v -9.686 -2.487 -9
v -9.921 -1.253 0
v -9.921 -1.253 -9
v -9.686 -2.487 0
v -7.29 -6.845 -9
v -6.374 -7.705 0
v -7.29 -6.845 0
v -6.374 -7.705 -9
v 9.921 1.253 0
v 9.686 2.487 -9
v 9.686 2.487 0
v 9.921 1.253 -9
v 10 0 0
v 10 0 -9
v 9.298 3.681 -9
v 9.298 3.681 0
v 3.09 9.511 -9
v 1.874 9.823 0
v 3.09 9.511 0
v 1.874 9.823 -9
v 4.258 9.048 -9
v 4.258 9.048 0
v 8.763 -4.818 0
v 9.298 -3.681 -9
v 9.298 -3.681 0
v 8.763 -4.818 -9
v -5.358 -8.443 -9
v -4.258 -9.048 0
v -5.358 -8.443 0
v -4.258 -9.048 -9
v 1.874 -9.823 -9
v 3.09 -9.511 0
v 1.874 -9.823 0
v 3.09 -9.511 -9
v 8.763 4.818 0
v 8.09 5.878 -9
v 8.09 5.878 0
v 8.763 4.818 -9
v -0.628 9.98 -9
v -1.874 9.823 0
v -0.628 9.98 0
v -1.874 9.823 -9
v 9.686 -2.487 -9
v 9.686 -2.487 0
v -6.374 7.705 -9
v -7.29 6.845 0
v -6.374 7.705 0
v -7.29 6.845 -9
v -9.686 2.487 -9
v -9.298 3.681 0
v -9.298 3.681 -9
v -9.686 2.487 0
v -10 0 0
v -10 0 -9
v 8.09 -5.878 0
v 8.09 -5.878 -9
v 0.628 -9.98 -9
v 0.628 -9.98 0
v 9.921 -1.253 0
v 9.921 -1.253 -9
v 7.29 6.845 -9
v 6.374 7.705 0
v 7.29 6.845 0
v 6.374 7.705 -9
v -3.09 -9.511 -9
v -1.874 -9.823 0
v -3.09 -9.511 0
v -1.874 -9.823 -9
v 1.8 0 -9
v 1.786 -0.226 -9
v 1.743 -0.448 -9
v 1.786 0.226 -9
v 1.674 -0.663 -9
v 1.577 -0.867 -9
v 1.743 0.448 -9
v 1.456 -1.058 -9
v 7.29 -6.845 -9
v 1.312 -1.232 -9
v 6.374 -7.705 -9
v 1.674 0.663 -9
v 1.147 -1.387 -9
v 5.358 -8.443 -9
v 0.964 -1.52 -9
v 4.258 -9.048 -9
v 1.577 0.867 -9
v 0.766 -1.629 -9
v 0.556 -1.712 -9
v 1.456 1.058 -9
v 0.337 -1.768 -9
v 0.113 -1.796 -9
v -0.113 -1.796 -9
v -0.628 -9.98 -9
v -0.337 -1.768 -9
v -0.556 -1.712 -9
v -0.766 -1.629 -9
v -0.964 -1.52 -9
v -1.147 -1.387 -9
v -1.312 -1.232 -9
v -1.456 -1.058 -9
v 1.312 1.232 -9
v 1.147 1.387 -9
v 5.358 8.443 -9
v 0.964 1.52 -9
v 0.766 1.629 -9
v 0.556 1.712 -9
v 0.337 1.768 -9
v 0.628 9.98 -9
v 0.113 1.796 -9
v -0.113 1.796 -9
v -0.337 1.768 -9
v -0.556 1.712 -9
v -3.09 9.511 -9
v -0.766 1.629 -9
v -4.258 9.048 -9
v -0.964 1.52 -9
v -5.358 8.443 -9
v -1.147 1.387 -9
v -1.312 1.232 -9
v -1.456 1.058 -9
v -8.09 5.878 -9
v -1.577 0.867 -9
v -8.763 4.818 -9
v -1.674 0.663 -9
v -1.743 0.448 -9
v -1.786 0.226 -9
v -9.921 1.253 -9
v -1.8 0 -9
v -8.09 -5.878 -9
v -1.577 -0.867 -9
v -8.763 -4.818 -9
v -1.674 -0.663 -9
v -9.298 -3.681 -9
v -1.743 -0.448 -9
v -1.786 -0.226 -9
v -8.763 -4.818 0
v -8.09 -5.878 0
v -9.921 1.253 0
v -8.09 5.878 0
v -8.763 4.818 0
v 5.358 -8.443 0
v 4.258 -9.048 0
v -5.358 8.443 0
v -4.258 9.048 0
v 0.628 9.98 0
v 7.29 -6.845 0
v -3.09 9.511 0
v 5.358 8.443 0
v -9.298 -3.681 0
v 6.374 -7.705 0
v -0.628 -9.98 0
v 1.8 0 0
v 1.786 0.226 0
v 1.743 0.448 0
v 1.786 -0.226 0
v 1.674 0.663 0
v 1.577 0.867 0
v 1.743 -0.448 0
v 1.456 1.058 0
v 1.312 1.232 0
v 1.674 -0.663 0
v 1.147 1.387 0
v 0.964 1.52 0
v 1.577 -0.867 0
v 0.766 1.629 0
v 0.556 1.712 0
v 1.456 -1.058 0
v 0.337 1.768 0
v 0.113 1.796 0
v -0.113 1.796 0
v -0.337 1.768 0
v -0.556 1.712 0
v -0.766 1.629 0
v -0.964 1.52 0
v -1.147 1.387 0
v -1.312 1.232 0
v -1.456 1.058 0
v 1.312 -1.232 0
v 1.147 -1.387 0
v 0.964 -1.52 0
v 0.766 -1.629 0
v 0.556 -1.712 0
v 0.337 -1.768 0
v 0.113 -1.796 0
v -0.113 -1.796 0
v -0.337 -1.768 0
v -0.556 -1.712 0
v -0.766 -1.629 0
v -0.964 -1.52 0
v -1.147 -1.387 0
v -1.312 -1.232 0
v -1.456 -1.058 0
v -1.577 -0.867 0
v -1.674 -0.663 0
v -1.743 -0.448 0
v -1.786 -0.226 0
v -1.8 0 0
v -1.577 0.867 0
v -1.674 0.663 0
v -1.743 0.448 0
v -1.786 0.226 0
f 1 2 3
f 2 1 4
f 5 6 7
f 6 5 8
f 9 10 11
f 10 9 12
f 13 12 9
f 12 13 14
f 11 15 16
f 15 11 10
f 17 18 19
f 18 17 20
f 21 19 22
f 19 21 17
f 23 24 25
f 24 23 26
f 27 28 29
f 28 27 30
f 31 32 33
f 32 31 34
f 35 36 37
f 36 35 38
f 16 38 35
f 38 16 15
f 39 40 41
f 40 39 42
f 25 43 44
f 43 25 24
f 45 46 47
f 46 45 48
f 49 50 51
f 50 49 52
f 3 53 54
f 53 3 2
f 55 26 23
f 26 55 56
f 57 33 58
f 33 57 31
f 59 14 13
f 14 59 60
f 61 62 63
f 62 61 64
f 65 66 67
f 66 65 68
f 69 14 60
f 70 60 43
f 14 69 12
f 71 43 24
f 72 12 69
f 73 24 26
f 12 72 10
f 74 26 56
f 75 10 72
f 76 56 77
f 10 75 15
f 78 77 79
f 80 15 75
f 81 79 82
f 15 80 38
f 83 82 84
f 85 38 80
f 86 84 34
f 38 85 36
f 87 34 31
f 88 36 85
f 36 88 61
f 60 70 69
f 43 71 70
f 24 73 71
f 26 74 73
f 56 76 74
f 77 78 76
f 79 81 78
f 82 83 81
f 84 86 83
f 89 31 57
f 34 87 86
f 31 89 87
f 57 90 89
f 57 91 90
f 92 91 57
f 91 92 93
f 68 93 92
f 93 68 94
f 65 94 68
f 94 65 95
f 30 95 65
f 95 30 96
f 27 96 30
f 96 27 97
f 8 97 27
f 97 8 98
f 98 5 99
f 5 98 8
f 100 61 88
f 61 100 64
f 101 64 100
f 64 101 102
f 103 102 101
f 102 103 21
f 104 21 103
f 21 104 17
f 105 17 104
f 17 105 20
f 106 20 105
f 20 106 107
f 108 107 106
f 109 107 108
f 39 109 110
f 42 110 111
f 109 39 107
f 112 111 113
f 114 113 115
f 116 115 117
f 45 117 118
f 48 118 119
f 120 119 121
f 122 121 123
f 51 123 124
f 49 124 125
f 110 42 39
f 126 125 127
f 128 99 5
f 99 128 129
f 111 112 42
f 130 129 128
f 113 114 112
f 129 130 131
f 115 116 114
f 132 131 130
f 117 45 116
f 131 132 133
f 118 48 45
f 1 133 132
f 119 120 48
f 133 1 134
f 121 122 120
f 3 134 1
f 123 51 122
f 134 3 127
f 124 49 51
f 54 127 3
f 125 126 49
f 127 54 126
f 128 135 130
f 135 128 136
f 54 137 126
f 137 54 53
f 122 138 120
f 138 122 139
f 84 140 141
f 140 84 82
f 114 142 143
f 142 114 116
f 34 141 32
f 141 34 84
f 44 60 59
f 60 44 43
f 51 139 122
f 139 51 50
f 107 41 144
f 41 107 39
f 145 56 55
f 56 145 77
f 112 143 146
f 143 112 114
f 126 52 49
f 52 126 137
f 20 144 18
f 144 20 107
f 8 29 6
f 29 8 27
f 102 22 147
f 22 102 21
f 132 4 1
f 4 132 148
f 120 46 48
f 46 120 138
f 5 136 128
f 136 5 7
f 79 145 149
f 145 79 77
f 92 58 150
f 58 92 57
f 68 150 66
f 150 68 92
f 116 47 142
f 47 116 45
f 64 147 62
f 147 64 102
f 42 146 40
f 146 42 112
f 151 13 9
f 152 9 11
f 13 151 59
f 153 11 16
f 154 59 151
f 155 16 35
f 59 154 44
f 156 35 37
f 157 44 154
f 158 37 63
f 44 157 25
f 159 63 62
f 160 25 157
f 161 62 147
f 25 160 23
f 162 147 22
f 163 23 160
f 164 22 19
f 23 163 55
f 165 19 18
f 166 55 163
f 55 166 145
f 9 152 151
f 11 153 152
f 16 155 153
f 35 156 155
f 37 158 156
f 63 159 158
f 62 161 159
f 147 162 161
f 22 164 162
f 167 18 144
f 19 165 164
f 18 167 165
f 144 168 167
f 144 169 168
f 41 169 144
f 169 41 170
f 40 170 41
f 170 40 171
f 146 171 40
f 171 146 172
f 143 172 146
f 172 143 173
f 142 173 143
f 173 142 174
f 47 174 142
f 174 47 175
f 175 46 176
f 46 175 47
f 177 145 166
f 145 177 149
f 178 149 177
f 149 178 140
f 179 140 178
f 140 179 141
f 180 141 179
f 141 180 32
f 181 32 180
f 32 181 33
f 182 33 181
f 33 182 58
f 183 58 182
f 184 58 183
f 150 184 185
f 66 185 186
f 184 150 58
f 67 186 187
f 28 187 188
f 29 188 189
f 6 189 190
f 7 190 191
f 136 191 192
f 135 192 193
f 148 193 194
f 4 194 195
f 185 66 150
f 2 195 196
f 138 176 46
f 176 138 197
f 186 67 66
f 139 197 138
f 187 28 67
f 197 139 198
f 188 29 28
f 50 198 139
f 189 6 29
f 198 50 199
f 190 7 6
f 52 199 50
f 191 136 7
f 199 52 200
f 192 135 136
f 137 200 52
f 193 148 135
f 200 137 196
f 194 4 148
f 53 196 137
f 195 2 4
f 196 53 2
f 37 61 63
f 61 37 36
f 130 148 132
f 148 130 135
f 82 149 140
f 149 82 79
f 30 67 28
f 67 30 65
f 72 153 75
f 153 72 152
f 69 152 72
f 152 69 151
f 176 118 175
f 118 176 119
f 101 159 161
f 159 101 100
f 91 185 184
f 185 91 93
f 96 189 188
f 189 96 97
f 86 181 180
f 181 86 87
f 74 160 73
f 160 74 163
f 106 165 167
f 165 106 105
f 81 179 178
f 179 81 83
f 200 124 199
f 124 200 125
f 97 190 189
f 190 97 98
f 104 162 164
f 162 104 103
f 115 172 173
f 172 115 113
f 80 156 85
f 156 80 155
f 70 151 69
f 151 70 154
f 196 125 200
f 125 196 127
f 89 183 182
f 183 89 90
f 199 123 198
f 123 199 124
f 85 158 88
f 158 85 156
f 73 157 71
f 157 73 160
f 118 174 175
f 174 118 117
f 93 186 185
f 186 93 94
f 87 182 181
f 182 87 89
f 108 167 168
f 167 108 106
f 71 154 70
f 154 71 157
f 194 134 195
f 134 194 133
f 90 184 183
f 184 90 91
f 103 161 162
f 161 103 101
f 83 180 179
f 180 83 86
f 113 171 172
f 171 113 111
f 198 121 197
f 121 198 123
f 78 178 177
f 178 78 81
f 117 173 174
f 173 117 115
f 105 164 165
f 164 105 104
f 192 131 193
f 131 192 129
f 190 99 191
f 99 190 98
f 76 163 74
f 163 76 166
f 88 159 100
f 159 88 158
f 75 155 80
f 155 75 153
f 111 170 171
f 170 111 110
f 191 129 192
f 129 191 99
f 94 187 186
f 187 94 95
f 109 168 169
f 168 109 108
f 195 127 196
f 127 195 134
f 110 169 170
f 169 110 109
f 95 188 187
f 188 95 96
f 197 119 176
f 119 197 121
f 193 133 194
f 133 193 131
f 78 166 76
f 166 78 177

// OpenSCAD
$fn = 50;


difference() {
	union() {
		translate(v = [0, 0, -9.0000000000]) {
			cylinder(h = 9, r = 10.0000000000);
		}
		cylinder(h = 0, r = 13.0000000000);
	}
	union() {
		#translate(v = [0, 0, -9]) {
			cylinder(h = 9, r = 1.8000000000);
		}
	}
}
